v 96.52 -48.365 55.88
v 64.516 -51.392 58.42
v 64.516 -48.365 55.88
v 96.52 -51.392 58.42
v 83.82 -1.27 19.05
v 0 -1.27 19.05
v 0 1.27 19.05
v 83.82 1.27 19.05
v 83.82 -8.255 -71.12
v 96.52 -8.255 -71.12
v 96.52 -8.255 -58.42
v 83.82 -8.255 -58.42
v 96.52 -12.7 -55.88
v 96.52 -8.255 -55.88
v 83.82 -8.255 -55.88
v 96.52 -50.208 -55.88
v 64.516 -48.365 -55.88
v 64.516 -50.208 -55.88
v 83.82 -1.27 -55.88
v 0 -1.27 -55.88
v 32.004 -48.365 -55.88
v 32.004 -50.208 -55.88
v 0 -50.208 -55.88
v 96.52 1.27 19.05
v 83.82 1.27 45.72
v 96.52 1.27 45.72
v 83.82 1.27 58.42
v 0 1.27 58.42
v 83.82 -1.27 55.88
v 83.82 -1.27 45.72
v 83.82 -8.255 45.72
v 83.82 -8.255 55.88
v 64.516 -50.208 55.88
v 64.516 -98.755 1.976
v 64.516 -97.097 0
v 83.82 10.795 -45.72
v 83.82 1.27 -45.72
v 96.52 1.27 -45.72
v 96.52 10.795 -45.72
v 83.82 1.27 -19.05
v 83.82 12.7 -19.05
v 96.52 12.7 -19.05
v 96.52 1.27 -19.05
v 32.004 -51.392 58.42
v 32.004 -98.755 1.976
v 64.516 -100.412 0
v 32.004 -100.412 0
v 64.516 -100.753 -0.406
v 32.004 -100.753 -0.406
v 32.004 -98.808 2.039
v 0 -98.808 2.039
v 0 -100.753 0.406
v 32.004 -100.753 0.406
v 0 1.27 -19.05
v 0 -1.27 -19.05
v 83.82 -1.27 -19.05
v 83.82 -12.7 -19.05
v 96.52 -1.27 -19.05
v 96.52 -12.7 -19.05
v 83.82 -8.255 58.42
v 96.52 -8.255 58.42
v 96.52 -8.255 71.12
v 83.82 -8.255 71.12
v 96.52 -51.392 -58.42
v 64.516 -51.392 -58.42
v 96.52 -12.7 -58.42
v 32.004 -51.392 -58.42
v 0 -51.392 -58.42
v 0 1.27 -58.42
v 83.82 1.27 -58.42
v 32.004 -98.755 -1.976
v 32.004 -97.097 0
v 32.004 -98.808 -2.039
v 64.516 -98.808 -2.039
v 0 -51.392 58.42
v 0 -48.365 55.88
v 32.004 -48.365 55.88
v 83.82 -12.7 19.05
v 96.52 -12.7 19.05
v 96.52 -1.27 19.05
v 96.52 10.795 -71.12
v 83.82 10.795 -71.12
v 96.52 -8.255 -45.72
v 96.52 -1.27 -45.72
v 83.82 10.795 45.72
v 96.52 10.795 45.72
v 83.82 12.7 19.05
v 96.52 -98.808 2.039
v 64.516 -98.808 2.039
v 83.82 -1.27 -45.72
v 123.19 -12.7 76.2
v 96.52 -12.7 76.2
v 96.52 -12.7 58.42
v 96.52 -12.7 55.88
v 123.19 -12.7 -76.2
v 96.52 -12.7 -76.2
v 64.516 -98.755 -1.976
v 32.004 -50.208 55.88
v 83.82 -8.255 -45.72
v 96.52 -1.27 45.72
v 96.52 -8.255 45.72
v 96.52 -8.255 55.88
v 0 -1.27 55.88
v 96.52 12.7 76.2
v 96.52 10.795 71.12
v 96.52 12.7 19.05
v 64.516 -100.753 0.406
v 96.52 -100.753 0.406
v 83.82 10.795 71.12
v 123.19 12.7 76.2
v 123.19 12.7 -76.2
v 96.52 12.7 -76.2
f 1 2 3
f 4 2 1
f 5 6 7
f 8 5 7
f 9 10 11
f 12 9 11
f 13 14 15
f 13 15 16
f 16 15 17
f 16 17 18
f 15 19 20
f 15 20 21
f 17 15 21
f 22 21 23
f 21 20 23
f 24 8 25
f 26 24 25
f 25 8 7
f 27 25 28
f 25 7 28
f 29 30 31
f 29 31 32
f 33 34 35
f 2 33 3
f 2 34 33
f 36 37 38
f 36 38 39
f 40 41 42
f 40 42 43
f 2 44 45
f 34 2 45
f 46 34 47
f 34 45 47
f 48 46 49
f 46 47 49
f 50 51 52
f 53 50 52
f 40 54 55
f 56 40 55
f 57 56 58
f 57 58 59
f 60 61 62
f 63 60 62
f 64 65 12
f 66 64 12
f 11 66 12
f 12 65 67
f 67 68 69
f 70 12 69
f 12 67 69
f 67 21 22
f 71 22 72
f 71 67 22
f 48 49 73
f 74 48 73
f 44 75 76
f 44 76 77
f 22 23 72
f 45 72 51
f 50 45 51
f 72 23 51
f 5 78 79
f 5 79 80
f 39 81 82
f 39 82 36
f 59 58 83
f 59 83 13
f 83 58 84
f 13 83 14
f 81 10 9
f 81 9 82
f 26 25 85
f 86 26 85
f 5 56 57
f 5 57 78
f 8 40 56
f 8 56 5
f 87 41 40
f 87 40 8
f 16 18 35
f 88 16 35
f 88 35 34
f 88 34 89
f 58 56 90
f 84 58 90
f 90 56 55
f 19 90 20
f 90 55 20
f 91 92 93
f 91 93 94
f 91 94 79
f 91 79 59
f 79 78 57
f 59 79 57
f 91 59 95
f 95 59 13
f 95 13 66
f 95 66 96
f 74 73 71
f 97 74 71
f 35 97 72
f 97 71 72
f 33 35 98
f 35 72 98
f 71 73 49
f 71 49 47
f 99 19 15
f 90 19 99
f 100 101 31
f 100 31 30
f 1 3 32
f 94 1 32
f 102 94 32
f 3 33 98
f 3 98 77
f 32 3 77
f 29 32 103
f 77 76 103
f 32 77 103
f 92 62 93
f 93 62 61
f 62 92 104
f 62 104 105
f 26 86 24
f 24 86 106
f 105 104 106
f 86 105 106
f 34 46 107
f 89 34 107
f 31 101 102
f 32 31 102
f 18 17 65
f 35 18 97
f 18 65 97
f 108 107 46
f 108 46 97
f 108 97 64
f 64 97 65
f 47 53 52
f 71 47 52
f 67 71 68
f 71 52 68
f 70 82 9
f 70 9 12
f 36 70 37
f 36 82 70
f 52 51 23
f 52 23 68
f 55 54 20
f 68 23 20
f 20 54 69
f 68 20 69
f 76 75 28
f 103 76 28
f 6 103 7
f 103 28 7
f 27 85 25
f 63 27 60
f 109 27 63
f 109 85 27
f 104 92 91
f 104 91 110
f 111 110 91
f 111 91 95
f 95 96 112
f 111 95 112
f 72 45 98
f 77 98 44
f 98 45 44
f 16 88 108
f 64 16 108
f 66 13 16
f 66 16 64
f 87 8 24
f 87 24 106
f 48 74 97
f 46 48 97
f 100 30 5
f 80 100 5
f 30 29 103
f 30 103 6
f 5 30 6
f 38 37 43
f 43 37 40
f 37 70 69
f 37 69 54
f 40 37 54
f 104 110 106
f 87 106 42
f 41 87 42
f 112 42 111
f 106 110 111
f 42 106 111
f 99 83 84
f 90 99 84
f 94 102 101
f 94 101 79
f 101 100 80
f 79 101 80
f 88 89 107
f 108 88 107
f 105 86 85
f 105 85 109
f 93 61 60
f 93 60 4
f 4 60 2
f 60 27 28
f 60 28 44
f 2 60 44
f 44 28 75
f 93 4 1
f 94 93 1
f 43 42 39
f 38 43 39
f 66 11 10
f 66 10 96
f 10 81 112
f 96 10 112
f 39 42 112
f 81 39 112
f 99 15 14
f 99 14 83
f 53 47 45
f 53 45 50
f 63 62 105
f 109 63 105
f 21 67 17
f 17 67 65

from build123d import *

# Parameters (mm, degrees)
EXTRUDE_THIN4_DEPTH   = 96.52
EXTRUDE_THIN4_2_DEPTH = 96.52
SKETCH5_W             = 32.004
SKETCH5_H             = 76.792210726
CUT_EXTRUDE2_DEPTH    = 26.67
SKETCH6_W             = 32.512
SKETCH6_H             = 76.792210726
CUT_EXTRUDE3_DEPTH    = 26.67
SKETCH7_W             = 152.4
SKETCH7_H             = 25.4
BOSS_EXTRUDE1_DEPTH   = 26.67
BOSS_EXTRUDE2_DEPTH   = 12.7
SKETCH13_W            = 25.4
SKETCH13_H            = 19.05
BOSS_EXTRUDE3_DEPTH   = 12.7


with BuildPart() as part:
    # Sketch1 → Extrude-Thin4 (new body)
    with BuildSketch(Plane(origin=(0, 0, 0), x_dir=(0, 0, -1), z_dir=(1, 0, 0))):
        Polygon((19.05, -1.27), (55.88, -1.27), (55.88, -50.207789274), (-2.03892683, -98.807539415), (-0.406246301, -100.753292301), (58.42, -51.392210726), (58.42, 1.27), (19.05, 1.27), align=None)
    extrude(amount=EXTRUDE_THIN4_DEPTH)

    # Sketch6 → Cut-Extrude3 (cut)
    with BuildSketch(Plane(origin=(0, -58.924421698, -49.443460514), x_dir=(1, 0, 0), z_dir=(0, -0.7660444431189791, -0.6427876096865379))):
        with Locations((48.26, 26.678065285)):
            Rectangle(SKETCH6_W, SKETCH6_H)
    extrude(amount=-CUT_EXTRUDE3_DEPTH, mode=Mode.SUBTRACT)



with BuildPart() as body_2:
    # Sketch1 → Extrude-Thin4 2 (new body)
    with BuildSketch(Plane(origin=(0, 0, 0), x_dir=(0, 0, -1), z_dir=(1, 0, 0))):
        Polygon((-19.05, 1.27), (-58.42, 1.27), (-58.42, -51.392210726), (0.406246301, -100.753292301), (2.03892683, -98.807539415), (-55.88, -50.207789274), (-55.88, -1.27), (-19.05, -1.27), align=None)
    extrude(amount=EXTRUDE_THIN4_2_DEPTH)

    # Sketch5 → Cut-Extrude2 (cut)
    with BuildSketch(Plane(origin=(0, -58.924421698, 49.443460514), x_dir=(1, 0, 0), z_dir=(0, -0.7660444431189799, 0.6427876096865373))):
        with Locations((16.002, -26.678065285)):
            Rectangle(SKETCH5_W, SKETCH5_H)
        with Locations((80.518, -26.678065285)):
            Rectangle(SKETCH5_W, SKETCH5_H)
    extrude(amount=-CUT_EXTRUDE2_DEPTH, mode=Mode.SUBTRACT)


with BuildPart() as part_1:
    add(part.part)

    add(body_2.part)  # Boss-Extrude1 merges body 2
    # Sketch7 → Boss-Extrude1 (add)
    with BuildSketch(Plane(origin=(96.52, 0, 0), x_dir=(0, 0, -1), z_dir=(1, 0, 0))):
        Rectangle(SKETCH7_W, SKETCH7_H)
    extrude(amount=BOSS_EXTRUDE1_DEPTH)

    # Sketch8 → Boss-Extrude2 (add)
    with BuildSketch(Plane.ZY.offset(-96.52)):
        Polygon((0, -12.7), (0, 12.7), (-19.05, 12.7), (-19.05, 1.27), (-19.05, -1.27), (-19.05, -12.7), align=None)
        Polygon((19.05, 1.27), (19.05, 12.7), (0, 12.7), (0, -12.7), (19.05, -12.7), (19.05, -1.27), align=None)
    extrude(amount=BOSS_EXTRUDE2_DEPTH)

    # Sketch13 → Boss-Extrude3 (add)
    with BuildSketch(Plane.ZY.offset(-96.52)):
        with Locations((-58.42, 1.27)):
            Rectangle(SKETCH13_W, SKETCH13_H)
        with Locations((58.42, 1.27)):
            Rectangle(SKETCH13_W, SKETCH13_H)
    extrude(amount=BOSS_EXTRUDE3_DEPTH)


solid = part_1.part
